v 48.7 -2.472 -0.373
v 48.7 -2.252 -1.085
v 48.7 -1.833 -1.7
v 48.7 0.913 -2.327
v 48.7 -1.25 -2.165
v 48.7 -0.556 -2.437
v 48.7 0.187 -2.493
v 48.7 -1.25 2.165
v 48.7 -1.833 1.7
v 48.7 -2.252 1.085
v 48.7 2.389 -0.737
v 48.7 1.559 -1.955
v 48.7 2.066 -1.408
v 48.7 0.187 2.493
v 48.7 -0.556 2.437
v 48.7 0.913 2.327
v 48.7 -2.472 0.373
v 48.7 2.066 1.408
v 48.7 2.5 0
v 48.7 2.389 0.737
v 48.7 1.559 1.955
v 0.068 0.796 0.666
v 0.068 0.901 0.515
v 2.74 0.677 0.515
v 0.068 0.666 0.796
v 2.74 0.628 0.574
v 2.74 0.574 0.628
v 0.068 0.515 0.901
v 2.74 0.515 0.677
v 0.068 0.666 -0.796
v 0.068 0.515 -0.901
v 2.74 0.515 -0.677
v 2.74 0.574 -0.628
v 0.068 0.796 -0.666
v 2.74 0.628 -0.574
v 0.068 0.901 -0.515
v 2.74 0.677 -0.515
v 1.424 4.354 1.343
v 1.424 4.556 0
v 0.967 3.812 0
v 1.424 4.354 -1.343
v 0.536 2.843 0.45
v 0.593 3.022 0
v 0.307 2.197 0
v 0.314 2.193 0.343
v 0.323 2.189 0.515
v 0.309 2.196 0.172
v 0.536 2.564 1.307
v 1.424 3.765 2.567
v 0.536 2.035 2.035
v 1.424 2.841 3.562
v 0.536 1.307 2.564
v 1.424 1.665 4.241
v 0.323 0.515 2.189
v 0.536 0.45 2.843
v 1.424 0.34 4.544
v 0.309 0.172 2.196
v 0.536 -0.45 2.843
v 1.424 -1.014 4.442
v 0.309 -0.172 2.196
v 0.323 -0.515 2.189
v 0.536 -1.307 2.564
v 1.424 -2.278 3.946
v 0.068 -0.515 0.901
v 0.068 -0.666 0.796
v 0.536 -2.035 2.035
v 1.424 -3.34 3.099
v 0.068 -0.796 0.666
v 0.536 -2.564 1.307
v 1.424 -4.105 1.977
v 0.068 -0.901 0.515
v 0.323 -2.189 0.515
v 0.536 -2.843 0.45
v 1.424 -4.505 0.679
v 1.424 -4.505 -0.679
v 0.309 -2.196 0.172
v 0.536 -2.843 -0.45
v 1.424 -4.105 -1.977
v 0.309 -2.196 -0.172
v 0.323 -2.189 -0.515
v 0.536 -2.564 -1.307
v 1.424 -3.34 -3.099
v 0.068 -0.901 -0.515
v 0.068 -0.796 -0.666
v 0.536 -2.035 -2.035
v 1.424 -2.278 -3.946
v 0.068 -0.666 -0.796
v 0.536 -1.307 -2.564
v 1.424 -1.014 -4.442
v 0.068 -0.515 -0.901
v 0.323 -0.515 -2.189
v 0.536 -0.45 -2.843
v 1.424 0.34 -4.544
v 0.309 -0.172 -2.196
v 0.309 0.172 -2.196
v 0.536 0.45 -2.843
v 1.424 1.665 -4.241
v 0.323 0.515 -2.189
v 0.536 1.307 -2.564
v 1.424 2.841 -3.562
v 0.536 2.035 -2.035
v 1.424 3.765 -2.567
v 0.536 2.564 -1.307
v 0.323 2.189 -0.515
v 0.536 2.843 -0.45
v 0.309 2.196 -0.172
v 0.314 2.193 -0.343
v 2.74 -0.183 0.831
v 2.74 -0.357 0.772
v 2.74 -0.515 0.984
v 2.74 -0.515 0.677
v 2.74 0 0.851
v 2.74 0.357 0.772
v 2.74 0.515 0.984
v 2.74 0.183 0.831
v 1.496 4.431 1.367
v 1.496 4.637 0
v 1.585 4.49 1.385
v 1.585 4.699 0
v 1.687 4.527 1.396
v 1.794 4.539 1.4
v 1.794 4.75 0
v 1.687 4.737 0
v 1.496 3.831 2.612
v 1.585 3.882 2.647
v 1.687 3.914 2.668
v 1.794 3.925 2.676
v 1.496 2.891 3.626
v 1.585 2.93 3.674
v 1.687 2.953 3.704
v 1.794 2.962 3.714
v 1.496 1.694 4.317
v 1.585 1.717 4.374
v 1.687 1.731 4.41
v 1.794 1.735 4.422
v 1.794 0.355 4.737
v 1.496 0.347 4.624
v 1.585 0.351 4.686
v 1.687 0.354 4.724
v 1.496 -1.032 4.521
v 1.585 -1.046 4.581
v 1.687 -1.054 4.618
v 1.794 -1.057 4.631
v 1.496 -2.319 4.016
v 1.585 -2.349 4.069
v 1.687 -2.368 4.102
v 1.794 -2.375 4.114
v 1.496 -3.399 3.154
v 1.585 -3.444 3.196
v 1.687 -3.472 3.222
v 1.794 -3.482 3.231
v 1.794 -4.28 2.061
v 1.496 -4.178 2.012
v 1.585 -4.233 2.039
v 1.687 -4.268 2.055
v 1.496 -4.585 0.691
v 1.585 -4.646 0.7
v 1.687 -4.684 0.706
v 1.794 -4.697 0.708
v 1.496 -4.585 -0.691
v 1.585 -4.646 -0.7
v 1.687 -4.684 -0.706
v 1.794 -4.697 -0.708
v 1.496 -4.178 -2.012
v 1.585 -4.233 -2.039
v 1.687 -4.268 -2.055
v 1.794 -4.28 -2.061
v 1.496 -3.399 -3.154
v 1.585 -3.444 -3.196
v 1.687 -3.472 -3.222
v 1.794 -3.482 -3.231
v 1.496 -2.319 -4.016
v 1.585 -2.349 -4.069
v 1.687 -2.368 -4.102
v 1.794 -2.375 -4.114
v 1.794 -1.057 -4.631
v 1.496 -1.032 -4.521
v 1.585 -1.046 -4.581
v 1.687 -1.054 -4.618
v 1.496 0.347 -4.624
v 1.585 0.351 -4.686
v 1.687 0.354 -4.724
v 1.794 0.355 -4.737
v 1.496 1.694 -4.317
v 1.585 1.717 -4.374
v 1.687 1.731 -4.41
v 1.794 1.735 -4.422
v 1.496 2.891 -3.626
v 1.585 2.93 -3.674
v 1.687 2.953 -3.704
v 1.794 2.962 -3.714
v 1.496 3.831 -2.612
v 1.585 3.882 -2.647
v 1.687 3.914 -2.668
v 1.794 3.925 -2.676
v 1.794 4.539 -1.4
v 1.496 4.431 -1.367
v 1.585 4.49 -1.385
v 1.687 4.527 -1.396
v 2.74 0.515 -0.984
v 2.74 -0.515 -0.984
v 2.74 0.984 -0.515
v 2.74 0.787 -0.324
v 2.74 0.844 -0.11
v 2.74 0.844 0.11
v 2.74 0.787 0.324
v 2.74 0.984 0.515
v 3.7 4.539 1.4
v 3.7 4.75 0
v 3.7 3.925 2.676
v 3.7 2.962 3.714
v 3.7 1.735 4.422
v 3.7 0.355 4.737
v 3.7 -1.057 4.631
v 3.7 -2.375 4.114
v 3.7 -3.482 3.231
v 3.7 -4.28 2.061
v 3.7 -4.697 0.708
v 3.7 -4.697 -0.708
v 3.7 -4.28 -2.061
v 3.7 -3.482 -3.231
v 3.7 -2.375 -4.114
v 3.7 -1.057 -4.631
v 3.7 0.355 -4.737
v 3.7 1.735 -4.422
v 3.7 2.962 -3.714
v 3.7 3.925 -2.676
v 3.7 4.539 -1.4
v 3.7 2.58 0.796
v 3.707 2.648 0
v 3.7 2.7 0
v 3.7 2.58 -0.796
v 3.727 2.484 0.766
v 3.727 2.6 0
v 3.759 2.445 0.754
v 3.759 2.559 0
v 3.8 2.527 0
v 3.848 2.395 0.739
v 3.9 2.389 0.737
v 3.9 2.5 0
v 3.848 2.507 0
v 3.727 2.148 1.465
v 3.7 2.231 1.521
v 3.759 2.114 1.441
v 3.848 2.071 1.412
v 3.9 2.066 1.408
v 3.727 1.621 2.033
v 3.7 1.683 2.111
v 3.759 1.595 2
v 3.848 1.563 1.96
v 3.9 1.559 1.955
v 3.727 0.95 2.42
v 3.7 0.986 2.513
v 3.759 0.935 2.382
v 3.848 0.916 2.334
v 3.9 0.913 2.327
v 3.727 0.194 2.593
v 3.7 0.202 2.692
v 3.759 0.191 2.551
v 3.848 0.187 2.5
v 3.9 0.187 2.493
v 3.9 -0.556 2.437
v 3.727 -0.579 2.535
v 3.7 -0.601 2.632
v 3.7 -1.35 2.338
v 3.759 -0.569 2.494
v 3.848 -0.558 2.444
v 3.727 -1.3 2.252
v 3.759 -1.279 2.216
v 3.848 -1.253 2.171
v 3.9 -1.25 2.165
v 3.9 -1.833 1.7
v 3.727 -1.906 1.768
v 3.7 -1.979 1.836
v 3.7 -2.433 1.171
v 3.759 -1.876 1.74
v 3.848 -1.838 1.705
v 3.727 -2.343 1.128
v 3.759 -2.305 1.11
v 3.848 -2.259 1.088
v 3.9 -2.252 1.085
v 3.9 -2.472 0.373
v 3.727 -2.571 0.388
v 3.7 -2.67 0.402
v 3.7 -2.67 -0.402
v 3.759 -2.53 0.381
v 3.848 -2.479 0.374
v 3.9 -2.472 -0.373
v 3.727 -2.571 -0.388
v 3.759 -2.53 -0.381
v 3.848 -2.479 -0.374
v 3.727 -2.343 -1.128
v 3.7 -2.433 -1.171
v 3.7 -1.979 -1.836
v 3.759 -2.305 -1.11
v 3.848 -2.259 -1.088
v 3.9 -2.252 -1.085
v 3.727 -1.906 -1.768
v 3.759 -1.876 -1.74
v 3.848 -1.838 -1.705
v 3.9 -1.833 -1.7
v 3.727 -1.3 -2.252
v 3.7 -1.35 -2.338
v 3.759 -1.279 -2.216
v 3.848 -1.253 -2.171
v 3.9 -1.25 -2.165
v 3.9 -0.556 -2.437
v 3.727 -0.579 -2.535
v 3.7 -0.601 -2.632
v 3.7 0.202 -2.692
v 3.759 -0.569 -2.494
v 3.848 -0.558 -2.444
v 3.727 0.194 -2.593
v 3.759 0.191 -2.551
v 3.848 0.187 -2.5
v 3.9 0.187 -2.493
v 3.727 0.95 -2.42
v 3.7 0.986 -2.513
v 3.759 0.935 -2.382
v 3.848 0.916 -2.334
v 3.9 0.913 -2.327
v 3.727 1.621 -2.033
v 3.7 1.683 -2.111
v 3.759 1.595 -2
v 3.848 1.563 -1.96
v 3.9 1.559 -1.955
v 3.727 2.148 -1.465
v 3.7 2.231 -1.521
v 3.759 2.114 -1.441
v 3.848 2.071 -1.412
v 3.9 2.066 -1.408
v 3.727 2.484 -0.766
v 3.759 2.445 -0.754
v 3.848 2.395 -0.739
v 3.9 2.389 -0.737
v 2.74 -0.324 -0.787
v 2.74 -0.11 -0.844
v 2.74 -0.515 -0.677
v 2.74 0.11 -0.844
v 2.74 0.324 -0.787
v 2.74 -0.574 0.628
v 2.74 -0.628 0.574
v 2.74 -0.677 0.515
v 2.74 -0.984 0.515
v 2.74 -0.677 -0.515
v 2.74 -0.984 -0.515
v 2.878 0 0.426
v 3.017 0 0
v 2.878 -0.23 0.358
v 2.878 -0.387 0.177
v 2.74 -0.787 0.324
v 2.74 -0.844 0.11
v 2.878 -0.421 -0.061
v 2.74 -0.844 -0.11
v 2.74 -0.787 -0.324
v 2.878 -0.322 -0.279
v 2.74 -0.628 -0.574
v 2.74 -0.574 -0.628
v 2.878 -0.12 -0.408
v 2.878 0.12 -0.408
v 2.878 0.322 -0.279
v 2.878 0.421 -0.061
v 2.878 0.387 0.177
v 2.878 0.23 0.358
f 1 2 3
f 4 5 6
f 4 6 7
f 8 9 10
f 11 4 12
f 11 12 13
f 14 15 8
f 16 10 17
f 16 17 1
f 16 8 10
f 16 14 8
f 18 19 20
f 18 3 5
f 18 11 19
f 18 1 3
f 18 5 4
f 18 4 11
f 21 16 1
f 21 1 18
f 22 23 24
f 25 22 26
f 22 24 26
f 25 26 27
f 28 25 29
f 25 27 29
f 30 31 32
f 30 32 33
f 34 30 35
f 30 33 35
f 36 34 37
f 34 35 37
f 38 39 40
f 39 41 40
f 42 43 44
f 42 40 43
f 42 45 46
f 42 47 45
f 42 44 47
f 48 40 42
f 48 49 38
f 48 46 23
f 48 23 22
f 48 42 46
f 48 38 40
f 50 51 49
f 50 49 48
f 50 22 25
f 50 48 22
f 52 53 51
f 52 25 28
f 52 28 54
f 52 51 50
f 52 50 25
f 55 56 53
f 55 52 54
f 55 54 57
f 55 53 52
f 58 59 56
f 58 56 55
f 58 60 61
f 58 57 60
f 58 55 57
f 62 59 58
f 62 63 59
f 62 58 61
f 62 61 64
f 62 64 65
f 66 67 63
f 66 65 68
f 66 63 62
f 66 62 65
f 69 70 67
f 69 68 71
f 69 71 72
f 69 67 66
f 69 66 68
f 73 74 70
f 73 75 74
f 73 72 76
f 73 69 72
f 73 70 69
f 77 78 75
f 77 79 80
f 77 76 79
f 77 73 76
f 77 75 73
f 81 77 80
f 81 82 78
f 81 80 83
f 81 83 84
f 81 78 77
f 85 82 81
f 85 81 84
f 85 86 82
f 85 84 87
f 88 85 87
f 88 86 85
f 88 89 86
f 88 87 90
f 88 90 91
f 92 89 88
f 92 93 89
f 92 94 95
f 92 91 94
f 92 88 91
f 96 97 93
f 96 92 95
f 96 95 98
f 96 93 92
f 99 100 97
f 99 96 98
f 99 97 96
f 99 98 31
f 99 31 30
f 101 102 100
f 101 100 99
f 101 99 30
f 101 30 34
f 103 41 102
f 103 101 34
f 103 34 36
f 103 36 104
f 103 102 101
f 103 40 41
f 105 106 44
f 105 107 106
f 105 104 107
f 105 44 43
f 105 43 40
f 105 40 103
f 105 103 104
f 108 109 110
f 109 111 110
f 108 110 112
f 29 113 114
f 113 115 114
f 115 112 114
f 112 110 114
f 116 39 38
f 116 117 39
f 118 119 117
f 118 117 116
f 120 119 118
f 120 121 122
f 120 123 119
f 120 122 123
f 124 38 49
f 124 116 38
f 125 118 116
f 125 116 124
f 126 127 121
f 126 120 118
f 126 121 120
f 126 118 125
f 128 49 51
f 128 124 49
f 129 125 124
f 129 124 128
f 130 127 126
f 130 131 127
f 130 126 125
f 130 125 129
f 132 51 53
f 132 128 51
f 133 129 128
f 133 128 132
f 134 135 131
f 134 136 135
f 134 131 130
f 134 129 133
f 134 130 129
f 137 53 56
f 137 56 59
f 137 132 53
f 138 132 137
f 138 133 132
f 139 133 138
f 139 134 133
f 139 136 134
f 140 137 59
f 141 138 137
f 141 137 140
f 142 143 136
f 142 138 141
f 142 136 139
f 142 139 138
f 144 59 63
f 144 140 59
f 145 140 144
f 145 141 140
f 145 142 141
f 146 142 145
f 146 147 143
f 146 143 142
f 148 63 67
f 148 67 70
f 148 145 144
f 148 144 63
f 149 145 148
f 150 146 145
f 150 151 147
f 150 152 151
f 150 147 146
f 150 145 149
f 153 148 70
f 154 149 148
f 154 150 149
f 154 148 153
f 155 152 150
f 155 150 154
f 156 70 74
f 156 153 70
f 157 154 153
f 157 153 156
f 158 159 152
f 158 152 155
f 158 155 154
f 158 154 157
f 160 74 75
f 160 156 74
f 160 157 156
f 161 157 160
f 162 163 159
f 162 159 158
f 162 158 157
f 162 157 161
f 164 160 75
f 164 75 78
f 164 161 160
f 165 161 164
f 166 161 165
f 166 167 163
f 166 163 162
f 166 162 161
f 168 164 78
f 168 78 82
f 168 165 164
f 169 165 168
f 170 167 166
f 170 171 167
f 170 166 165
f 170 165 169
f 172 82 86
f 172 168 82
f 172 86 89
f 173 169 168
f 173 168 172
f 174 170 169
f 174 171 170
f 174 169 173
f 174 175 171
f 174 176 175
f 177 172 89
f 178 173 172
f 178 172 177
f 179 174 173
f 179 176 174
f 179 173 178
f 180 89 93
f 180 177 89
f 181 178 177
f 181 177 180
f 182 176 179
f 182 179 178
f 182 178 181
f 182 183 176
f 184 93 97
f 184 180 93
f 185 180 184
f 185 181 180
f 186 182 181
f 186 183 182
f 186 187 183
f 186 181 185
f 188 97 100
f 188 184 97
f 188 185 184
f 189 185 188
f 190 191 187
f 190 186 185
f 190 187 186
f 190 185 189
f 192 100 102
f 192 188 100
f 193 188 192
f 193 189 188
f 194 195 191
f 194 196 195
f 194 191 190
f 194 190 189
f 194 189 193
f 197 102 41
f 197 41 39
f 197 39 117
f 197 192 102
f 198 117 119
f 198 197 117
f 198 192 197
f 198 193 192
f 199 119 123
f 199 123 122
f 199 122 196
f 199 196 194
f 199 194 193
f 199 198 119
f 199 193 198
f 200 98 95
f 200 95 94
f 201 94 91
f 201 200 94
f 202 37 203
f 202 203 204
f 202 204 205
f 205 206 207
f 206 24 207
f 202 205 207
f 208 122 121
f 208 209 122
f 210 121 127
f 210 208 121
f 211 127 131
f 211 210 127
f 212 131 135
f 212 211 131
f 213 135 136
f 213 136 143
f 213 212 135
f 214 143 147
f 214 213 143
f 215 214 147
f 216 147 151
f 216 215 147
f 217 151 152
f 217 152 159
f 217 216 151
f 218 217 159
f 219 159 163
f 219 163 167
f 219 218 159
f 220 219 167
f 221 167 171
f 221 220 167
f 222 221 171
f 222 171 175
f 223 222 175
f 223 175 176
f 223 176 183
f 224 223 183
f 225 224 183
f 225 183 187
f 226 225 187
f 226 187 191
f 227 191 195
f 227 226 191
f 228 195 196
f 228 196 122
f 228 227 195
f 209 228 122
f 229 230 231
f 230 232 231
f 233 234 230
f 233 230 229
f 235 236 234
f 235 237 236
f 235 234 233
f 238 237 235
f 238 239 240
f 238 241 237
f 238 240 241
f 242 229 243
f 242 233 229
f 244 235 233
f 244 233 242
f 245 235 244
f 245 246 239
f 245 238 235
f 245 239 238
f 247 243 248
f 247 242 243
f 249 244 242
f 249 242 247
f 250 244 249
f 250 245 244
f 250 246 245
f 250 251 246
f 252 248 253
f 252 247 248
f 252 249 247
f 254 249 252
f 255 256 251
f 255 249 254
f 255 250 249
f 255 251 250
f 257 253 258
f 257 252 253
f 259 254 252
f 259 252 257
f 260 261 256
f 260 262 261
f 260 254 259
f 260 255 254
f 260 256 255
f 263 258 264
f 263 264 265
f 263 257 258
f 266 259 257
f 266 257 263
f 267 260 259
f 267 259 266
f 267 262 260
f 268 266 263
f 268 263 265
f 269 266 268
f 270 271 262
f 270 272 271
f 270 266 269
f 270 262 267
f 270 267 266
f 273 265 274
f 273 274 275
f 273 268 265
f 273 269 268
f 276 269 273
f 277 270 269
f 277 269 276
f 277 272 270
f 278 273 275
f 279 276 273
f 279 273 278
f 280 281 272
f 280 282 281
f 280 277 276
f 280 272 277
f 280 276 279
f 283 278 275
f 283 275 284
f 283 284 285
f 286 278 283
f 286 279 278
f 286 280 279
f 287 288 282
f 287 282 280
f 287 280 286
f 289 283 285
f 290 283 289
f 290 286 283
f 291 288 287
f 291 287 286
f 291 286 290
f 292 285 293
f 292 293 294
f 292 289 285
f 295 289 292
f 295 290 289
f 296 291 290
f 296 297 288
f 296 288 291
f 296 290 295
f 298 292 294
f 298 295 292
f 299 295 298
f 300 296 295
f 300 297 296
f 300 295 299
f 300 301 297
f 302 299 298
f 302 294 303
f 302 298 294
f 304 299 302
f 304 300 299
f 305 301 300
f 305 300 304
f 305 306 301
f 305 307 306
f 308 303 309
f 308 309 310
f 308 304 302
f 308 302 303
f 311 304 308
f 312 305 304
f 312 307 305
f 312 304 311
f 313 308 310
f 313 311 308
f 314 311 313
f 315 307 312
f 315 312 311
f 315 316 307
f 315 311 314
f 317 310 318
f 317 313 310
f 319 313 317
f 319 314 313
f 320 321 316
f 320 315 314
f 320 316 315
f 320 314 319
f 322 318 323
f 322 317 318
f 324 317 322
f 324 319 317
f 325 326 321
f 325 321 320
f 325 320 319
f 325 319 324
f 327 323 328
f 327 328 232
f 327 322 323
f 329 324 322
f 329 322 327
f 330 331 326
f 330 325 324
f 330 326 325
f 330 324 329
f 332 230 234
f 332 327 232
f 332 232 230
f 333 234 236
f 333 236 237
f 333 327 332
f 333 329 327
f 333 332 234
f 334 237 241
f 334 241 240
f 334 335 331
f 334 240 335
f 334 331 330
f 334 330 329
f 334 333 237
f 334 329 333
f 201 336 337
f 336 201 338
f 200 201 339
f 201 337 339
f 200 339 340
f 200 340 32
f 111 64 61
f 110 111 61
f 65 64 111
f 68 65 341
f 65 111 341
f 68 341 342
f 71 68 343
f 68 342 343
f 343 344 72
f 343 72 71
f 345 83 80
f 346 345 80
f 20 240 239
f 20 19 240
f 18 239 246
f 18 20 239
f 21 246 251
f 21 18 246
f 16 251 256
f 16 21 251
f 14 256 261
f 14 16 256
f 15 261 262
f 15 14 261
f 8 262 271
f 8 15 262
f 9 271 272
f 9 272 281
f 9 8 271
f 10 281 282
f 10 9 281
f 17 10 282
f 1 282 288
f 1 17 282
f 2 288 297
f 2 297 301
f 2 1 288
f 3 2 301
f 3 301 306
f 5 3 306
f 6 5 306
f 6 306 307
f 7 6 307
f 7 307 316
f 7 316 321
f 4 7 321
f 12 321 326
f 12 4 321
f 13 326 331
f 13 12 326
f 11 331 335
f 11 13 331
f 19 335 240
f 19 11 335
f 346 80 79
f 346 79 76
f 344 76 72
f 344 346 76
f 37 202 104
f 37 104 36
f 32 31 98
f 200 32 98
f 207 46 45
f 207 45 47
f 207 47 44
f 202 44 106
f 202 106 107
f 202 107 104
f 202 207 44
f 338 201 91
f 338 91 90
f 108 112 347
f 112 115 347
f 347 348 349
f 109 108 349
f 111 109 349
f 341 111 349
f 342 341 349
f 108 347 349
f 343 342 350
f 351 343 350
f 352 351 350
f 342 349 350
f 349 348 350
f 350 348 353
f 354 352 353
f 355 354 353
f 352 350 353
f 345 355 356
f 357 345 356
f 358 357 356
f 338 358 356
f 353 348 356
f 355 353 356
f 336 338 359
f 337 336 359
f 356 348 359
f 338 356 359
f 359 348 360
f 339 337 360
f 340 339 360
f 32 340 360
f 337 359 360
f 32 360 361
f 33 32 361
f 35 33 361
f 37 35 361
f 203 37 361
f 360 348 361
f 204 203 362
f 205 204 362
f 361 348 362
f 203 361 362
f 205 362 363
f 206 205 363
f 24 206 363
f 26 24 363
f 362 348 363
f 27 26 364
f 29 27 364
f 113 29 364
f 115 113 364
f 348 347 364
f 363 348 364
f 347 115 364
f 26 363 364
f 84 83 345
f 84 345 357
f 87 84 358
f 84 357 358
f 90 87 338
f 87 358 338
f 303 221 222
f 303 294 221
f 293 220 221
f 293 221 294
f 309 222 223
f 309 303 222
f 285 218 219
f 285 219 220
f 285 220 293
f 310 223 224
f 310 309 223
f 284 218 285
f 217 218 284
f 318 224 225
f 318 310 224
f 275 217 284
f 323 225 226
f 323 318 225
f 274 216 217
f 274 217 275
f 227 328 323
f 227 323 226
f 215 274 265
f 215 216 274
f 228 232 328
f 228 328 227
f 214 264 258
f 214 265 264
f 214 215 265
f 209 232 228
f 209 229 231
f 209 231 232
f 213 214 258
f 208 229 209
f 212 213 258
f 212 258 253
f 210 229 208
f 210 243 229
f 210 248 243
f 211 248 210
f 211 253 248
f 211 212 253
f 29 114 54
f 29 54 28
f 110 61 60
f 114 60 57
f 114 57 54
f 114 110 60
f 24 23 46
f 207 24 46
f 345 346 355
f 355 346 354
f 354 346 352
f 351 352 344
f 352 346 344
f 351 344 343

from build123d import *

# Parameters (mm, degrees)
RECPAT_COUNT = 2
RECPAT_ANGLE = 90


with BuildPart() as part:
    # Fillet1: read off the stored shape, not the designer's step
    # Fillet1 outline → Fillet1 (revolve)
    with BuildSketch(Plane.YX):
        with BuildLine():
            Line((2.5, 3.9), (2.5, 48.7))
            Line((2.5, 48.7), (0, 48.7))
            Line((0, 48.7), (0, 0))
            ThreePointArc((0, 0), (2.386856711, 0.364365446), (4.556291394, 1.42427124))
            ThreePointArc((4.556291394, 1.42427124), (4.698642149, 1.58538712), (4.75, 1.79415598))
            Line((4.75, 1.79415598), (4.75, 3.7))
            Line((4.75, 3.7), (2.7, 3.7))
            ThreePointArc((2.7, 3.7), (2.558578644, 3.758578644), (2.5, 3.9))
        make_face()
    revolve(axis=Axis((0, 0, 0), (1, 0, 0)))

    # Sketch3 → Recess section 0
    with BuildSketch(Plane(origin=(0, 0, 0), x_dir=(0, 0, -1), z_dir=(1, 0, 0))):
        with BuildLine():
            Line((0.515, -2.35), (-0.515, -2.35))
            Line((-0.515, -2.35), (-0.515, 2.35))
            Line((-0.515, 2.35), (0.515, 2.35))
            Line((0.515, 2.35), (0.515, -2.35))
        make_face()
    # Sketch4 → Recess section 1
    with BuildSketch(Plane(origin=(2.74, 0, 0), x_dir=(0, 0, -1), z_dir=(1, 0, 0))):
        with BuildLine():
            Line((0.515, -0.983886622), (-0.515, -0.983886622))
            Line((-0.515, -0.983886622), (-0.515, 0.983886622))
            Line((-0.515, 0.983886622), (0.515, 0.983886622))
            Line((0.515, 0.983886622), (0.515, -0.983886622))
        make_face()
    recess = loft(mode=Mode.SUBTRACT)

    # RecPat: Recess ×2 about axis
    recpat_axis = Axis((0, 0, 0), (1, 0, 0))
    for i in range(1, RECPAT_COUNT):
        add(recess.rotate(recpat_axis, i * RECPAT_ANGLE / (RECPAT_COUNT - 1)), mode=Mode.SUBTRACT)

    # RecCorSke → RecessCore (revolve, cut)
    with BuildSketch(Plane.XY, mode=Mode.PRIVATE) as recesscore_sk:
        Polygon((0, 0), (0, 1.042599465), (2.74, 0.851), (3.016506661, 0), align=None)
    revolve(recesscore_sk.sketch.rotate(Axis((-3.175, 0, 0), (1, 0, 0)), 90), axis=Axis((-3.175, 0, 0), (1, 0, 0)), mode=Mode.SUBTRACT)


solid = part.part
